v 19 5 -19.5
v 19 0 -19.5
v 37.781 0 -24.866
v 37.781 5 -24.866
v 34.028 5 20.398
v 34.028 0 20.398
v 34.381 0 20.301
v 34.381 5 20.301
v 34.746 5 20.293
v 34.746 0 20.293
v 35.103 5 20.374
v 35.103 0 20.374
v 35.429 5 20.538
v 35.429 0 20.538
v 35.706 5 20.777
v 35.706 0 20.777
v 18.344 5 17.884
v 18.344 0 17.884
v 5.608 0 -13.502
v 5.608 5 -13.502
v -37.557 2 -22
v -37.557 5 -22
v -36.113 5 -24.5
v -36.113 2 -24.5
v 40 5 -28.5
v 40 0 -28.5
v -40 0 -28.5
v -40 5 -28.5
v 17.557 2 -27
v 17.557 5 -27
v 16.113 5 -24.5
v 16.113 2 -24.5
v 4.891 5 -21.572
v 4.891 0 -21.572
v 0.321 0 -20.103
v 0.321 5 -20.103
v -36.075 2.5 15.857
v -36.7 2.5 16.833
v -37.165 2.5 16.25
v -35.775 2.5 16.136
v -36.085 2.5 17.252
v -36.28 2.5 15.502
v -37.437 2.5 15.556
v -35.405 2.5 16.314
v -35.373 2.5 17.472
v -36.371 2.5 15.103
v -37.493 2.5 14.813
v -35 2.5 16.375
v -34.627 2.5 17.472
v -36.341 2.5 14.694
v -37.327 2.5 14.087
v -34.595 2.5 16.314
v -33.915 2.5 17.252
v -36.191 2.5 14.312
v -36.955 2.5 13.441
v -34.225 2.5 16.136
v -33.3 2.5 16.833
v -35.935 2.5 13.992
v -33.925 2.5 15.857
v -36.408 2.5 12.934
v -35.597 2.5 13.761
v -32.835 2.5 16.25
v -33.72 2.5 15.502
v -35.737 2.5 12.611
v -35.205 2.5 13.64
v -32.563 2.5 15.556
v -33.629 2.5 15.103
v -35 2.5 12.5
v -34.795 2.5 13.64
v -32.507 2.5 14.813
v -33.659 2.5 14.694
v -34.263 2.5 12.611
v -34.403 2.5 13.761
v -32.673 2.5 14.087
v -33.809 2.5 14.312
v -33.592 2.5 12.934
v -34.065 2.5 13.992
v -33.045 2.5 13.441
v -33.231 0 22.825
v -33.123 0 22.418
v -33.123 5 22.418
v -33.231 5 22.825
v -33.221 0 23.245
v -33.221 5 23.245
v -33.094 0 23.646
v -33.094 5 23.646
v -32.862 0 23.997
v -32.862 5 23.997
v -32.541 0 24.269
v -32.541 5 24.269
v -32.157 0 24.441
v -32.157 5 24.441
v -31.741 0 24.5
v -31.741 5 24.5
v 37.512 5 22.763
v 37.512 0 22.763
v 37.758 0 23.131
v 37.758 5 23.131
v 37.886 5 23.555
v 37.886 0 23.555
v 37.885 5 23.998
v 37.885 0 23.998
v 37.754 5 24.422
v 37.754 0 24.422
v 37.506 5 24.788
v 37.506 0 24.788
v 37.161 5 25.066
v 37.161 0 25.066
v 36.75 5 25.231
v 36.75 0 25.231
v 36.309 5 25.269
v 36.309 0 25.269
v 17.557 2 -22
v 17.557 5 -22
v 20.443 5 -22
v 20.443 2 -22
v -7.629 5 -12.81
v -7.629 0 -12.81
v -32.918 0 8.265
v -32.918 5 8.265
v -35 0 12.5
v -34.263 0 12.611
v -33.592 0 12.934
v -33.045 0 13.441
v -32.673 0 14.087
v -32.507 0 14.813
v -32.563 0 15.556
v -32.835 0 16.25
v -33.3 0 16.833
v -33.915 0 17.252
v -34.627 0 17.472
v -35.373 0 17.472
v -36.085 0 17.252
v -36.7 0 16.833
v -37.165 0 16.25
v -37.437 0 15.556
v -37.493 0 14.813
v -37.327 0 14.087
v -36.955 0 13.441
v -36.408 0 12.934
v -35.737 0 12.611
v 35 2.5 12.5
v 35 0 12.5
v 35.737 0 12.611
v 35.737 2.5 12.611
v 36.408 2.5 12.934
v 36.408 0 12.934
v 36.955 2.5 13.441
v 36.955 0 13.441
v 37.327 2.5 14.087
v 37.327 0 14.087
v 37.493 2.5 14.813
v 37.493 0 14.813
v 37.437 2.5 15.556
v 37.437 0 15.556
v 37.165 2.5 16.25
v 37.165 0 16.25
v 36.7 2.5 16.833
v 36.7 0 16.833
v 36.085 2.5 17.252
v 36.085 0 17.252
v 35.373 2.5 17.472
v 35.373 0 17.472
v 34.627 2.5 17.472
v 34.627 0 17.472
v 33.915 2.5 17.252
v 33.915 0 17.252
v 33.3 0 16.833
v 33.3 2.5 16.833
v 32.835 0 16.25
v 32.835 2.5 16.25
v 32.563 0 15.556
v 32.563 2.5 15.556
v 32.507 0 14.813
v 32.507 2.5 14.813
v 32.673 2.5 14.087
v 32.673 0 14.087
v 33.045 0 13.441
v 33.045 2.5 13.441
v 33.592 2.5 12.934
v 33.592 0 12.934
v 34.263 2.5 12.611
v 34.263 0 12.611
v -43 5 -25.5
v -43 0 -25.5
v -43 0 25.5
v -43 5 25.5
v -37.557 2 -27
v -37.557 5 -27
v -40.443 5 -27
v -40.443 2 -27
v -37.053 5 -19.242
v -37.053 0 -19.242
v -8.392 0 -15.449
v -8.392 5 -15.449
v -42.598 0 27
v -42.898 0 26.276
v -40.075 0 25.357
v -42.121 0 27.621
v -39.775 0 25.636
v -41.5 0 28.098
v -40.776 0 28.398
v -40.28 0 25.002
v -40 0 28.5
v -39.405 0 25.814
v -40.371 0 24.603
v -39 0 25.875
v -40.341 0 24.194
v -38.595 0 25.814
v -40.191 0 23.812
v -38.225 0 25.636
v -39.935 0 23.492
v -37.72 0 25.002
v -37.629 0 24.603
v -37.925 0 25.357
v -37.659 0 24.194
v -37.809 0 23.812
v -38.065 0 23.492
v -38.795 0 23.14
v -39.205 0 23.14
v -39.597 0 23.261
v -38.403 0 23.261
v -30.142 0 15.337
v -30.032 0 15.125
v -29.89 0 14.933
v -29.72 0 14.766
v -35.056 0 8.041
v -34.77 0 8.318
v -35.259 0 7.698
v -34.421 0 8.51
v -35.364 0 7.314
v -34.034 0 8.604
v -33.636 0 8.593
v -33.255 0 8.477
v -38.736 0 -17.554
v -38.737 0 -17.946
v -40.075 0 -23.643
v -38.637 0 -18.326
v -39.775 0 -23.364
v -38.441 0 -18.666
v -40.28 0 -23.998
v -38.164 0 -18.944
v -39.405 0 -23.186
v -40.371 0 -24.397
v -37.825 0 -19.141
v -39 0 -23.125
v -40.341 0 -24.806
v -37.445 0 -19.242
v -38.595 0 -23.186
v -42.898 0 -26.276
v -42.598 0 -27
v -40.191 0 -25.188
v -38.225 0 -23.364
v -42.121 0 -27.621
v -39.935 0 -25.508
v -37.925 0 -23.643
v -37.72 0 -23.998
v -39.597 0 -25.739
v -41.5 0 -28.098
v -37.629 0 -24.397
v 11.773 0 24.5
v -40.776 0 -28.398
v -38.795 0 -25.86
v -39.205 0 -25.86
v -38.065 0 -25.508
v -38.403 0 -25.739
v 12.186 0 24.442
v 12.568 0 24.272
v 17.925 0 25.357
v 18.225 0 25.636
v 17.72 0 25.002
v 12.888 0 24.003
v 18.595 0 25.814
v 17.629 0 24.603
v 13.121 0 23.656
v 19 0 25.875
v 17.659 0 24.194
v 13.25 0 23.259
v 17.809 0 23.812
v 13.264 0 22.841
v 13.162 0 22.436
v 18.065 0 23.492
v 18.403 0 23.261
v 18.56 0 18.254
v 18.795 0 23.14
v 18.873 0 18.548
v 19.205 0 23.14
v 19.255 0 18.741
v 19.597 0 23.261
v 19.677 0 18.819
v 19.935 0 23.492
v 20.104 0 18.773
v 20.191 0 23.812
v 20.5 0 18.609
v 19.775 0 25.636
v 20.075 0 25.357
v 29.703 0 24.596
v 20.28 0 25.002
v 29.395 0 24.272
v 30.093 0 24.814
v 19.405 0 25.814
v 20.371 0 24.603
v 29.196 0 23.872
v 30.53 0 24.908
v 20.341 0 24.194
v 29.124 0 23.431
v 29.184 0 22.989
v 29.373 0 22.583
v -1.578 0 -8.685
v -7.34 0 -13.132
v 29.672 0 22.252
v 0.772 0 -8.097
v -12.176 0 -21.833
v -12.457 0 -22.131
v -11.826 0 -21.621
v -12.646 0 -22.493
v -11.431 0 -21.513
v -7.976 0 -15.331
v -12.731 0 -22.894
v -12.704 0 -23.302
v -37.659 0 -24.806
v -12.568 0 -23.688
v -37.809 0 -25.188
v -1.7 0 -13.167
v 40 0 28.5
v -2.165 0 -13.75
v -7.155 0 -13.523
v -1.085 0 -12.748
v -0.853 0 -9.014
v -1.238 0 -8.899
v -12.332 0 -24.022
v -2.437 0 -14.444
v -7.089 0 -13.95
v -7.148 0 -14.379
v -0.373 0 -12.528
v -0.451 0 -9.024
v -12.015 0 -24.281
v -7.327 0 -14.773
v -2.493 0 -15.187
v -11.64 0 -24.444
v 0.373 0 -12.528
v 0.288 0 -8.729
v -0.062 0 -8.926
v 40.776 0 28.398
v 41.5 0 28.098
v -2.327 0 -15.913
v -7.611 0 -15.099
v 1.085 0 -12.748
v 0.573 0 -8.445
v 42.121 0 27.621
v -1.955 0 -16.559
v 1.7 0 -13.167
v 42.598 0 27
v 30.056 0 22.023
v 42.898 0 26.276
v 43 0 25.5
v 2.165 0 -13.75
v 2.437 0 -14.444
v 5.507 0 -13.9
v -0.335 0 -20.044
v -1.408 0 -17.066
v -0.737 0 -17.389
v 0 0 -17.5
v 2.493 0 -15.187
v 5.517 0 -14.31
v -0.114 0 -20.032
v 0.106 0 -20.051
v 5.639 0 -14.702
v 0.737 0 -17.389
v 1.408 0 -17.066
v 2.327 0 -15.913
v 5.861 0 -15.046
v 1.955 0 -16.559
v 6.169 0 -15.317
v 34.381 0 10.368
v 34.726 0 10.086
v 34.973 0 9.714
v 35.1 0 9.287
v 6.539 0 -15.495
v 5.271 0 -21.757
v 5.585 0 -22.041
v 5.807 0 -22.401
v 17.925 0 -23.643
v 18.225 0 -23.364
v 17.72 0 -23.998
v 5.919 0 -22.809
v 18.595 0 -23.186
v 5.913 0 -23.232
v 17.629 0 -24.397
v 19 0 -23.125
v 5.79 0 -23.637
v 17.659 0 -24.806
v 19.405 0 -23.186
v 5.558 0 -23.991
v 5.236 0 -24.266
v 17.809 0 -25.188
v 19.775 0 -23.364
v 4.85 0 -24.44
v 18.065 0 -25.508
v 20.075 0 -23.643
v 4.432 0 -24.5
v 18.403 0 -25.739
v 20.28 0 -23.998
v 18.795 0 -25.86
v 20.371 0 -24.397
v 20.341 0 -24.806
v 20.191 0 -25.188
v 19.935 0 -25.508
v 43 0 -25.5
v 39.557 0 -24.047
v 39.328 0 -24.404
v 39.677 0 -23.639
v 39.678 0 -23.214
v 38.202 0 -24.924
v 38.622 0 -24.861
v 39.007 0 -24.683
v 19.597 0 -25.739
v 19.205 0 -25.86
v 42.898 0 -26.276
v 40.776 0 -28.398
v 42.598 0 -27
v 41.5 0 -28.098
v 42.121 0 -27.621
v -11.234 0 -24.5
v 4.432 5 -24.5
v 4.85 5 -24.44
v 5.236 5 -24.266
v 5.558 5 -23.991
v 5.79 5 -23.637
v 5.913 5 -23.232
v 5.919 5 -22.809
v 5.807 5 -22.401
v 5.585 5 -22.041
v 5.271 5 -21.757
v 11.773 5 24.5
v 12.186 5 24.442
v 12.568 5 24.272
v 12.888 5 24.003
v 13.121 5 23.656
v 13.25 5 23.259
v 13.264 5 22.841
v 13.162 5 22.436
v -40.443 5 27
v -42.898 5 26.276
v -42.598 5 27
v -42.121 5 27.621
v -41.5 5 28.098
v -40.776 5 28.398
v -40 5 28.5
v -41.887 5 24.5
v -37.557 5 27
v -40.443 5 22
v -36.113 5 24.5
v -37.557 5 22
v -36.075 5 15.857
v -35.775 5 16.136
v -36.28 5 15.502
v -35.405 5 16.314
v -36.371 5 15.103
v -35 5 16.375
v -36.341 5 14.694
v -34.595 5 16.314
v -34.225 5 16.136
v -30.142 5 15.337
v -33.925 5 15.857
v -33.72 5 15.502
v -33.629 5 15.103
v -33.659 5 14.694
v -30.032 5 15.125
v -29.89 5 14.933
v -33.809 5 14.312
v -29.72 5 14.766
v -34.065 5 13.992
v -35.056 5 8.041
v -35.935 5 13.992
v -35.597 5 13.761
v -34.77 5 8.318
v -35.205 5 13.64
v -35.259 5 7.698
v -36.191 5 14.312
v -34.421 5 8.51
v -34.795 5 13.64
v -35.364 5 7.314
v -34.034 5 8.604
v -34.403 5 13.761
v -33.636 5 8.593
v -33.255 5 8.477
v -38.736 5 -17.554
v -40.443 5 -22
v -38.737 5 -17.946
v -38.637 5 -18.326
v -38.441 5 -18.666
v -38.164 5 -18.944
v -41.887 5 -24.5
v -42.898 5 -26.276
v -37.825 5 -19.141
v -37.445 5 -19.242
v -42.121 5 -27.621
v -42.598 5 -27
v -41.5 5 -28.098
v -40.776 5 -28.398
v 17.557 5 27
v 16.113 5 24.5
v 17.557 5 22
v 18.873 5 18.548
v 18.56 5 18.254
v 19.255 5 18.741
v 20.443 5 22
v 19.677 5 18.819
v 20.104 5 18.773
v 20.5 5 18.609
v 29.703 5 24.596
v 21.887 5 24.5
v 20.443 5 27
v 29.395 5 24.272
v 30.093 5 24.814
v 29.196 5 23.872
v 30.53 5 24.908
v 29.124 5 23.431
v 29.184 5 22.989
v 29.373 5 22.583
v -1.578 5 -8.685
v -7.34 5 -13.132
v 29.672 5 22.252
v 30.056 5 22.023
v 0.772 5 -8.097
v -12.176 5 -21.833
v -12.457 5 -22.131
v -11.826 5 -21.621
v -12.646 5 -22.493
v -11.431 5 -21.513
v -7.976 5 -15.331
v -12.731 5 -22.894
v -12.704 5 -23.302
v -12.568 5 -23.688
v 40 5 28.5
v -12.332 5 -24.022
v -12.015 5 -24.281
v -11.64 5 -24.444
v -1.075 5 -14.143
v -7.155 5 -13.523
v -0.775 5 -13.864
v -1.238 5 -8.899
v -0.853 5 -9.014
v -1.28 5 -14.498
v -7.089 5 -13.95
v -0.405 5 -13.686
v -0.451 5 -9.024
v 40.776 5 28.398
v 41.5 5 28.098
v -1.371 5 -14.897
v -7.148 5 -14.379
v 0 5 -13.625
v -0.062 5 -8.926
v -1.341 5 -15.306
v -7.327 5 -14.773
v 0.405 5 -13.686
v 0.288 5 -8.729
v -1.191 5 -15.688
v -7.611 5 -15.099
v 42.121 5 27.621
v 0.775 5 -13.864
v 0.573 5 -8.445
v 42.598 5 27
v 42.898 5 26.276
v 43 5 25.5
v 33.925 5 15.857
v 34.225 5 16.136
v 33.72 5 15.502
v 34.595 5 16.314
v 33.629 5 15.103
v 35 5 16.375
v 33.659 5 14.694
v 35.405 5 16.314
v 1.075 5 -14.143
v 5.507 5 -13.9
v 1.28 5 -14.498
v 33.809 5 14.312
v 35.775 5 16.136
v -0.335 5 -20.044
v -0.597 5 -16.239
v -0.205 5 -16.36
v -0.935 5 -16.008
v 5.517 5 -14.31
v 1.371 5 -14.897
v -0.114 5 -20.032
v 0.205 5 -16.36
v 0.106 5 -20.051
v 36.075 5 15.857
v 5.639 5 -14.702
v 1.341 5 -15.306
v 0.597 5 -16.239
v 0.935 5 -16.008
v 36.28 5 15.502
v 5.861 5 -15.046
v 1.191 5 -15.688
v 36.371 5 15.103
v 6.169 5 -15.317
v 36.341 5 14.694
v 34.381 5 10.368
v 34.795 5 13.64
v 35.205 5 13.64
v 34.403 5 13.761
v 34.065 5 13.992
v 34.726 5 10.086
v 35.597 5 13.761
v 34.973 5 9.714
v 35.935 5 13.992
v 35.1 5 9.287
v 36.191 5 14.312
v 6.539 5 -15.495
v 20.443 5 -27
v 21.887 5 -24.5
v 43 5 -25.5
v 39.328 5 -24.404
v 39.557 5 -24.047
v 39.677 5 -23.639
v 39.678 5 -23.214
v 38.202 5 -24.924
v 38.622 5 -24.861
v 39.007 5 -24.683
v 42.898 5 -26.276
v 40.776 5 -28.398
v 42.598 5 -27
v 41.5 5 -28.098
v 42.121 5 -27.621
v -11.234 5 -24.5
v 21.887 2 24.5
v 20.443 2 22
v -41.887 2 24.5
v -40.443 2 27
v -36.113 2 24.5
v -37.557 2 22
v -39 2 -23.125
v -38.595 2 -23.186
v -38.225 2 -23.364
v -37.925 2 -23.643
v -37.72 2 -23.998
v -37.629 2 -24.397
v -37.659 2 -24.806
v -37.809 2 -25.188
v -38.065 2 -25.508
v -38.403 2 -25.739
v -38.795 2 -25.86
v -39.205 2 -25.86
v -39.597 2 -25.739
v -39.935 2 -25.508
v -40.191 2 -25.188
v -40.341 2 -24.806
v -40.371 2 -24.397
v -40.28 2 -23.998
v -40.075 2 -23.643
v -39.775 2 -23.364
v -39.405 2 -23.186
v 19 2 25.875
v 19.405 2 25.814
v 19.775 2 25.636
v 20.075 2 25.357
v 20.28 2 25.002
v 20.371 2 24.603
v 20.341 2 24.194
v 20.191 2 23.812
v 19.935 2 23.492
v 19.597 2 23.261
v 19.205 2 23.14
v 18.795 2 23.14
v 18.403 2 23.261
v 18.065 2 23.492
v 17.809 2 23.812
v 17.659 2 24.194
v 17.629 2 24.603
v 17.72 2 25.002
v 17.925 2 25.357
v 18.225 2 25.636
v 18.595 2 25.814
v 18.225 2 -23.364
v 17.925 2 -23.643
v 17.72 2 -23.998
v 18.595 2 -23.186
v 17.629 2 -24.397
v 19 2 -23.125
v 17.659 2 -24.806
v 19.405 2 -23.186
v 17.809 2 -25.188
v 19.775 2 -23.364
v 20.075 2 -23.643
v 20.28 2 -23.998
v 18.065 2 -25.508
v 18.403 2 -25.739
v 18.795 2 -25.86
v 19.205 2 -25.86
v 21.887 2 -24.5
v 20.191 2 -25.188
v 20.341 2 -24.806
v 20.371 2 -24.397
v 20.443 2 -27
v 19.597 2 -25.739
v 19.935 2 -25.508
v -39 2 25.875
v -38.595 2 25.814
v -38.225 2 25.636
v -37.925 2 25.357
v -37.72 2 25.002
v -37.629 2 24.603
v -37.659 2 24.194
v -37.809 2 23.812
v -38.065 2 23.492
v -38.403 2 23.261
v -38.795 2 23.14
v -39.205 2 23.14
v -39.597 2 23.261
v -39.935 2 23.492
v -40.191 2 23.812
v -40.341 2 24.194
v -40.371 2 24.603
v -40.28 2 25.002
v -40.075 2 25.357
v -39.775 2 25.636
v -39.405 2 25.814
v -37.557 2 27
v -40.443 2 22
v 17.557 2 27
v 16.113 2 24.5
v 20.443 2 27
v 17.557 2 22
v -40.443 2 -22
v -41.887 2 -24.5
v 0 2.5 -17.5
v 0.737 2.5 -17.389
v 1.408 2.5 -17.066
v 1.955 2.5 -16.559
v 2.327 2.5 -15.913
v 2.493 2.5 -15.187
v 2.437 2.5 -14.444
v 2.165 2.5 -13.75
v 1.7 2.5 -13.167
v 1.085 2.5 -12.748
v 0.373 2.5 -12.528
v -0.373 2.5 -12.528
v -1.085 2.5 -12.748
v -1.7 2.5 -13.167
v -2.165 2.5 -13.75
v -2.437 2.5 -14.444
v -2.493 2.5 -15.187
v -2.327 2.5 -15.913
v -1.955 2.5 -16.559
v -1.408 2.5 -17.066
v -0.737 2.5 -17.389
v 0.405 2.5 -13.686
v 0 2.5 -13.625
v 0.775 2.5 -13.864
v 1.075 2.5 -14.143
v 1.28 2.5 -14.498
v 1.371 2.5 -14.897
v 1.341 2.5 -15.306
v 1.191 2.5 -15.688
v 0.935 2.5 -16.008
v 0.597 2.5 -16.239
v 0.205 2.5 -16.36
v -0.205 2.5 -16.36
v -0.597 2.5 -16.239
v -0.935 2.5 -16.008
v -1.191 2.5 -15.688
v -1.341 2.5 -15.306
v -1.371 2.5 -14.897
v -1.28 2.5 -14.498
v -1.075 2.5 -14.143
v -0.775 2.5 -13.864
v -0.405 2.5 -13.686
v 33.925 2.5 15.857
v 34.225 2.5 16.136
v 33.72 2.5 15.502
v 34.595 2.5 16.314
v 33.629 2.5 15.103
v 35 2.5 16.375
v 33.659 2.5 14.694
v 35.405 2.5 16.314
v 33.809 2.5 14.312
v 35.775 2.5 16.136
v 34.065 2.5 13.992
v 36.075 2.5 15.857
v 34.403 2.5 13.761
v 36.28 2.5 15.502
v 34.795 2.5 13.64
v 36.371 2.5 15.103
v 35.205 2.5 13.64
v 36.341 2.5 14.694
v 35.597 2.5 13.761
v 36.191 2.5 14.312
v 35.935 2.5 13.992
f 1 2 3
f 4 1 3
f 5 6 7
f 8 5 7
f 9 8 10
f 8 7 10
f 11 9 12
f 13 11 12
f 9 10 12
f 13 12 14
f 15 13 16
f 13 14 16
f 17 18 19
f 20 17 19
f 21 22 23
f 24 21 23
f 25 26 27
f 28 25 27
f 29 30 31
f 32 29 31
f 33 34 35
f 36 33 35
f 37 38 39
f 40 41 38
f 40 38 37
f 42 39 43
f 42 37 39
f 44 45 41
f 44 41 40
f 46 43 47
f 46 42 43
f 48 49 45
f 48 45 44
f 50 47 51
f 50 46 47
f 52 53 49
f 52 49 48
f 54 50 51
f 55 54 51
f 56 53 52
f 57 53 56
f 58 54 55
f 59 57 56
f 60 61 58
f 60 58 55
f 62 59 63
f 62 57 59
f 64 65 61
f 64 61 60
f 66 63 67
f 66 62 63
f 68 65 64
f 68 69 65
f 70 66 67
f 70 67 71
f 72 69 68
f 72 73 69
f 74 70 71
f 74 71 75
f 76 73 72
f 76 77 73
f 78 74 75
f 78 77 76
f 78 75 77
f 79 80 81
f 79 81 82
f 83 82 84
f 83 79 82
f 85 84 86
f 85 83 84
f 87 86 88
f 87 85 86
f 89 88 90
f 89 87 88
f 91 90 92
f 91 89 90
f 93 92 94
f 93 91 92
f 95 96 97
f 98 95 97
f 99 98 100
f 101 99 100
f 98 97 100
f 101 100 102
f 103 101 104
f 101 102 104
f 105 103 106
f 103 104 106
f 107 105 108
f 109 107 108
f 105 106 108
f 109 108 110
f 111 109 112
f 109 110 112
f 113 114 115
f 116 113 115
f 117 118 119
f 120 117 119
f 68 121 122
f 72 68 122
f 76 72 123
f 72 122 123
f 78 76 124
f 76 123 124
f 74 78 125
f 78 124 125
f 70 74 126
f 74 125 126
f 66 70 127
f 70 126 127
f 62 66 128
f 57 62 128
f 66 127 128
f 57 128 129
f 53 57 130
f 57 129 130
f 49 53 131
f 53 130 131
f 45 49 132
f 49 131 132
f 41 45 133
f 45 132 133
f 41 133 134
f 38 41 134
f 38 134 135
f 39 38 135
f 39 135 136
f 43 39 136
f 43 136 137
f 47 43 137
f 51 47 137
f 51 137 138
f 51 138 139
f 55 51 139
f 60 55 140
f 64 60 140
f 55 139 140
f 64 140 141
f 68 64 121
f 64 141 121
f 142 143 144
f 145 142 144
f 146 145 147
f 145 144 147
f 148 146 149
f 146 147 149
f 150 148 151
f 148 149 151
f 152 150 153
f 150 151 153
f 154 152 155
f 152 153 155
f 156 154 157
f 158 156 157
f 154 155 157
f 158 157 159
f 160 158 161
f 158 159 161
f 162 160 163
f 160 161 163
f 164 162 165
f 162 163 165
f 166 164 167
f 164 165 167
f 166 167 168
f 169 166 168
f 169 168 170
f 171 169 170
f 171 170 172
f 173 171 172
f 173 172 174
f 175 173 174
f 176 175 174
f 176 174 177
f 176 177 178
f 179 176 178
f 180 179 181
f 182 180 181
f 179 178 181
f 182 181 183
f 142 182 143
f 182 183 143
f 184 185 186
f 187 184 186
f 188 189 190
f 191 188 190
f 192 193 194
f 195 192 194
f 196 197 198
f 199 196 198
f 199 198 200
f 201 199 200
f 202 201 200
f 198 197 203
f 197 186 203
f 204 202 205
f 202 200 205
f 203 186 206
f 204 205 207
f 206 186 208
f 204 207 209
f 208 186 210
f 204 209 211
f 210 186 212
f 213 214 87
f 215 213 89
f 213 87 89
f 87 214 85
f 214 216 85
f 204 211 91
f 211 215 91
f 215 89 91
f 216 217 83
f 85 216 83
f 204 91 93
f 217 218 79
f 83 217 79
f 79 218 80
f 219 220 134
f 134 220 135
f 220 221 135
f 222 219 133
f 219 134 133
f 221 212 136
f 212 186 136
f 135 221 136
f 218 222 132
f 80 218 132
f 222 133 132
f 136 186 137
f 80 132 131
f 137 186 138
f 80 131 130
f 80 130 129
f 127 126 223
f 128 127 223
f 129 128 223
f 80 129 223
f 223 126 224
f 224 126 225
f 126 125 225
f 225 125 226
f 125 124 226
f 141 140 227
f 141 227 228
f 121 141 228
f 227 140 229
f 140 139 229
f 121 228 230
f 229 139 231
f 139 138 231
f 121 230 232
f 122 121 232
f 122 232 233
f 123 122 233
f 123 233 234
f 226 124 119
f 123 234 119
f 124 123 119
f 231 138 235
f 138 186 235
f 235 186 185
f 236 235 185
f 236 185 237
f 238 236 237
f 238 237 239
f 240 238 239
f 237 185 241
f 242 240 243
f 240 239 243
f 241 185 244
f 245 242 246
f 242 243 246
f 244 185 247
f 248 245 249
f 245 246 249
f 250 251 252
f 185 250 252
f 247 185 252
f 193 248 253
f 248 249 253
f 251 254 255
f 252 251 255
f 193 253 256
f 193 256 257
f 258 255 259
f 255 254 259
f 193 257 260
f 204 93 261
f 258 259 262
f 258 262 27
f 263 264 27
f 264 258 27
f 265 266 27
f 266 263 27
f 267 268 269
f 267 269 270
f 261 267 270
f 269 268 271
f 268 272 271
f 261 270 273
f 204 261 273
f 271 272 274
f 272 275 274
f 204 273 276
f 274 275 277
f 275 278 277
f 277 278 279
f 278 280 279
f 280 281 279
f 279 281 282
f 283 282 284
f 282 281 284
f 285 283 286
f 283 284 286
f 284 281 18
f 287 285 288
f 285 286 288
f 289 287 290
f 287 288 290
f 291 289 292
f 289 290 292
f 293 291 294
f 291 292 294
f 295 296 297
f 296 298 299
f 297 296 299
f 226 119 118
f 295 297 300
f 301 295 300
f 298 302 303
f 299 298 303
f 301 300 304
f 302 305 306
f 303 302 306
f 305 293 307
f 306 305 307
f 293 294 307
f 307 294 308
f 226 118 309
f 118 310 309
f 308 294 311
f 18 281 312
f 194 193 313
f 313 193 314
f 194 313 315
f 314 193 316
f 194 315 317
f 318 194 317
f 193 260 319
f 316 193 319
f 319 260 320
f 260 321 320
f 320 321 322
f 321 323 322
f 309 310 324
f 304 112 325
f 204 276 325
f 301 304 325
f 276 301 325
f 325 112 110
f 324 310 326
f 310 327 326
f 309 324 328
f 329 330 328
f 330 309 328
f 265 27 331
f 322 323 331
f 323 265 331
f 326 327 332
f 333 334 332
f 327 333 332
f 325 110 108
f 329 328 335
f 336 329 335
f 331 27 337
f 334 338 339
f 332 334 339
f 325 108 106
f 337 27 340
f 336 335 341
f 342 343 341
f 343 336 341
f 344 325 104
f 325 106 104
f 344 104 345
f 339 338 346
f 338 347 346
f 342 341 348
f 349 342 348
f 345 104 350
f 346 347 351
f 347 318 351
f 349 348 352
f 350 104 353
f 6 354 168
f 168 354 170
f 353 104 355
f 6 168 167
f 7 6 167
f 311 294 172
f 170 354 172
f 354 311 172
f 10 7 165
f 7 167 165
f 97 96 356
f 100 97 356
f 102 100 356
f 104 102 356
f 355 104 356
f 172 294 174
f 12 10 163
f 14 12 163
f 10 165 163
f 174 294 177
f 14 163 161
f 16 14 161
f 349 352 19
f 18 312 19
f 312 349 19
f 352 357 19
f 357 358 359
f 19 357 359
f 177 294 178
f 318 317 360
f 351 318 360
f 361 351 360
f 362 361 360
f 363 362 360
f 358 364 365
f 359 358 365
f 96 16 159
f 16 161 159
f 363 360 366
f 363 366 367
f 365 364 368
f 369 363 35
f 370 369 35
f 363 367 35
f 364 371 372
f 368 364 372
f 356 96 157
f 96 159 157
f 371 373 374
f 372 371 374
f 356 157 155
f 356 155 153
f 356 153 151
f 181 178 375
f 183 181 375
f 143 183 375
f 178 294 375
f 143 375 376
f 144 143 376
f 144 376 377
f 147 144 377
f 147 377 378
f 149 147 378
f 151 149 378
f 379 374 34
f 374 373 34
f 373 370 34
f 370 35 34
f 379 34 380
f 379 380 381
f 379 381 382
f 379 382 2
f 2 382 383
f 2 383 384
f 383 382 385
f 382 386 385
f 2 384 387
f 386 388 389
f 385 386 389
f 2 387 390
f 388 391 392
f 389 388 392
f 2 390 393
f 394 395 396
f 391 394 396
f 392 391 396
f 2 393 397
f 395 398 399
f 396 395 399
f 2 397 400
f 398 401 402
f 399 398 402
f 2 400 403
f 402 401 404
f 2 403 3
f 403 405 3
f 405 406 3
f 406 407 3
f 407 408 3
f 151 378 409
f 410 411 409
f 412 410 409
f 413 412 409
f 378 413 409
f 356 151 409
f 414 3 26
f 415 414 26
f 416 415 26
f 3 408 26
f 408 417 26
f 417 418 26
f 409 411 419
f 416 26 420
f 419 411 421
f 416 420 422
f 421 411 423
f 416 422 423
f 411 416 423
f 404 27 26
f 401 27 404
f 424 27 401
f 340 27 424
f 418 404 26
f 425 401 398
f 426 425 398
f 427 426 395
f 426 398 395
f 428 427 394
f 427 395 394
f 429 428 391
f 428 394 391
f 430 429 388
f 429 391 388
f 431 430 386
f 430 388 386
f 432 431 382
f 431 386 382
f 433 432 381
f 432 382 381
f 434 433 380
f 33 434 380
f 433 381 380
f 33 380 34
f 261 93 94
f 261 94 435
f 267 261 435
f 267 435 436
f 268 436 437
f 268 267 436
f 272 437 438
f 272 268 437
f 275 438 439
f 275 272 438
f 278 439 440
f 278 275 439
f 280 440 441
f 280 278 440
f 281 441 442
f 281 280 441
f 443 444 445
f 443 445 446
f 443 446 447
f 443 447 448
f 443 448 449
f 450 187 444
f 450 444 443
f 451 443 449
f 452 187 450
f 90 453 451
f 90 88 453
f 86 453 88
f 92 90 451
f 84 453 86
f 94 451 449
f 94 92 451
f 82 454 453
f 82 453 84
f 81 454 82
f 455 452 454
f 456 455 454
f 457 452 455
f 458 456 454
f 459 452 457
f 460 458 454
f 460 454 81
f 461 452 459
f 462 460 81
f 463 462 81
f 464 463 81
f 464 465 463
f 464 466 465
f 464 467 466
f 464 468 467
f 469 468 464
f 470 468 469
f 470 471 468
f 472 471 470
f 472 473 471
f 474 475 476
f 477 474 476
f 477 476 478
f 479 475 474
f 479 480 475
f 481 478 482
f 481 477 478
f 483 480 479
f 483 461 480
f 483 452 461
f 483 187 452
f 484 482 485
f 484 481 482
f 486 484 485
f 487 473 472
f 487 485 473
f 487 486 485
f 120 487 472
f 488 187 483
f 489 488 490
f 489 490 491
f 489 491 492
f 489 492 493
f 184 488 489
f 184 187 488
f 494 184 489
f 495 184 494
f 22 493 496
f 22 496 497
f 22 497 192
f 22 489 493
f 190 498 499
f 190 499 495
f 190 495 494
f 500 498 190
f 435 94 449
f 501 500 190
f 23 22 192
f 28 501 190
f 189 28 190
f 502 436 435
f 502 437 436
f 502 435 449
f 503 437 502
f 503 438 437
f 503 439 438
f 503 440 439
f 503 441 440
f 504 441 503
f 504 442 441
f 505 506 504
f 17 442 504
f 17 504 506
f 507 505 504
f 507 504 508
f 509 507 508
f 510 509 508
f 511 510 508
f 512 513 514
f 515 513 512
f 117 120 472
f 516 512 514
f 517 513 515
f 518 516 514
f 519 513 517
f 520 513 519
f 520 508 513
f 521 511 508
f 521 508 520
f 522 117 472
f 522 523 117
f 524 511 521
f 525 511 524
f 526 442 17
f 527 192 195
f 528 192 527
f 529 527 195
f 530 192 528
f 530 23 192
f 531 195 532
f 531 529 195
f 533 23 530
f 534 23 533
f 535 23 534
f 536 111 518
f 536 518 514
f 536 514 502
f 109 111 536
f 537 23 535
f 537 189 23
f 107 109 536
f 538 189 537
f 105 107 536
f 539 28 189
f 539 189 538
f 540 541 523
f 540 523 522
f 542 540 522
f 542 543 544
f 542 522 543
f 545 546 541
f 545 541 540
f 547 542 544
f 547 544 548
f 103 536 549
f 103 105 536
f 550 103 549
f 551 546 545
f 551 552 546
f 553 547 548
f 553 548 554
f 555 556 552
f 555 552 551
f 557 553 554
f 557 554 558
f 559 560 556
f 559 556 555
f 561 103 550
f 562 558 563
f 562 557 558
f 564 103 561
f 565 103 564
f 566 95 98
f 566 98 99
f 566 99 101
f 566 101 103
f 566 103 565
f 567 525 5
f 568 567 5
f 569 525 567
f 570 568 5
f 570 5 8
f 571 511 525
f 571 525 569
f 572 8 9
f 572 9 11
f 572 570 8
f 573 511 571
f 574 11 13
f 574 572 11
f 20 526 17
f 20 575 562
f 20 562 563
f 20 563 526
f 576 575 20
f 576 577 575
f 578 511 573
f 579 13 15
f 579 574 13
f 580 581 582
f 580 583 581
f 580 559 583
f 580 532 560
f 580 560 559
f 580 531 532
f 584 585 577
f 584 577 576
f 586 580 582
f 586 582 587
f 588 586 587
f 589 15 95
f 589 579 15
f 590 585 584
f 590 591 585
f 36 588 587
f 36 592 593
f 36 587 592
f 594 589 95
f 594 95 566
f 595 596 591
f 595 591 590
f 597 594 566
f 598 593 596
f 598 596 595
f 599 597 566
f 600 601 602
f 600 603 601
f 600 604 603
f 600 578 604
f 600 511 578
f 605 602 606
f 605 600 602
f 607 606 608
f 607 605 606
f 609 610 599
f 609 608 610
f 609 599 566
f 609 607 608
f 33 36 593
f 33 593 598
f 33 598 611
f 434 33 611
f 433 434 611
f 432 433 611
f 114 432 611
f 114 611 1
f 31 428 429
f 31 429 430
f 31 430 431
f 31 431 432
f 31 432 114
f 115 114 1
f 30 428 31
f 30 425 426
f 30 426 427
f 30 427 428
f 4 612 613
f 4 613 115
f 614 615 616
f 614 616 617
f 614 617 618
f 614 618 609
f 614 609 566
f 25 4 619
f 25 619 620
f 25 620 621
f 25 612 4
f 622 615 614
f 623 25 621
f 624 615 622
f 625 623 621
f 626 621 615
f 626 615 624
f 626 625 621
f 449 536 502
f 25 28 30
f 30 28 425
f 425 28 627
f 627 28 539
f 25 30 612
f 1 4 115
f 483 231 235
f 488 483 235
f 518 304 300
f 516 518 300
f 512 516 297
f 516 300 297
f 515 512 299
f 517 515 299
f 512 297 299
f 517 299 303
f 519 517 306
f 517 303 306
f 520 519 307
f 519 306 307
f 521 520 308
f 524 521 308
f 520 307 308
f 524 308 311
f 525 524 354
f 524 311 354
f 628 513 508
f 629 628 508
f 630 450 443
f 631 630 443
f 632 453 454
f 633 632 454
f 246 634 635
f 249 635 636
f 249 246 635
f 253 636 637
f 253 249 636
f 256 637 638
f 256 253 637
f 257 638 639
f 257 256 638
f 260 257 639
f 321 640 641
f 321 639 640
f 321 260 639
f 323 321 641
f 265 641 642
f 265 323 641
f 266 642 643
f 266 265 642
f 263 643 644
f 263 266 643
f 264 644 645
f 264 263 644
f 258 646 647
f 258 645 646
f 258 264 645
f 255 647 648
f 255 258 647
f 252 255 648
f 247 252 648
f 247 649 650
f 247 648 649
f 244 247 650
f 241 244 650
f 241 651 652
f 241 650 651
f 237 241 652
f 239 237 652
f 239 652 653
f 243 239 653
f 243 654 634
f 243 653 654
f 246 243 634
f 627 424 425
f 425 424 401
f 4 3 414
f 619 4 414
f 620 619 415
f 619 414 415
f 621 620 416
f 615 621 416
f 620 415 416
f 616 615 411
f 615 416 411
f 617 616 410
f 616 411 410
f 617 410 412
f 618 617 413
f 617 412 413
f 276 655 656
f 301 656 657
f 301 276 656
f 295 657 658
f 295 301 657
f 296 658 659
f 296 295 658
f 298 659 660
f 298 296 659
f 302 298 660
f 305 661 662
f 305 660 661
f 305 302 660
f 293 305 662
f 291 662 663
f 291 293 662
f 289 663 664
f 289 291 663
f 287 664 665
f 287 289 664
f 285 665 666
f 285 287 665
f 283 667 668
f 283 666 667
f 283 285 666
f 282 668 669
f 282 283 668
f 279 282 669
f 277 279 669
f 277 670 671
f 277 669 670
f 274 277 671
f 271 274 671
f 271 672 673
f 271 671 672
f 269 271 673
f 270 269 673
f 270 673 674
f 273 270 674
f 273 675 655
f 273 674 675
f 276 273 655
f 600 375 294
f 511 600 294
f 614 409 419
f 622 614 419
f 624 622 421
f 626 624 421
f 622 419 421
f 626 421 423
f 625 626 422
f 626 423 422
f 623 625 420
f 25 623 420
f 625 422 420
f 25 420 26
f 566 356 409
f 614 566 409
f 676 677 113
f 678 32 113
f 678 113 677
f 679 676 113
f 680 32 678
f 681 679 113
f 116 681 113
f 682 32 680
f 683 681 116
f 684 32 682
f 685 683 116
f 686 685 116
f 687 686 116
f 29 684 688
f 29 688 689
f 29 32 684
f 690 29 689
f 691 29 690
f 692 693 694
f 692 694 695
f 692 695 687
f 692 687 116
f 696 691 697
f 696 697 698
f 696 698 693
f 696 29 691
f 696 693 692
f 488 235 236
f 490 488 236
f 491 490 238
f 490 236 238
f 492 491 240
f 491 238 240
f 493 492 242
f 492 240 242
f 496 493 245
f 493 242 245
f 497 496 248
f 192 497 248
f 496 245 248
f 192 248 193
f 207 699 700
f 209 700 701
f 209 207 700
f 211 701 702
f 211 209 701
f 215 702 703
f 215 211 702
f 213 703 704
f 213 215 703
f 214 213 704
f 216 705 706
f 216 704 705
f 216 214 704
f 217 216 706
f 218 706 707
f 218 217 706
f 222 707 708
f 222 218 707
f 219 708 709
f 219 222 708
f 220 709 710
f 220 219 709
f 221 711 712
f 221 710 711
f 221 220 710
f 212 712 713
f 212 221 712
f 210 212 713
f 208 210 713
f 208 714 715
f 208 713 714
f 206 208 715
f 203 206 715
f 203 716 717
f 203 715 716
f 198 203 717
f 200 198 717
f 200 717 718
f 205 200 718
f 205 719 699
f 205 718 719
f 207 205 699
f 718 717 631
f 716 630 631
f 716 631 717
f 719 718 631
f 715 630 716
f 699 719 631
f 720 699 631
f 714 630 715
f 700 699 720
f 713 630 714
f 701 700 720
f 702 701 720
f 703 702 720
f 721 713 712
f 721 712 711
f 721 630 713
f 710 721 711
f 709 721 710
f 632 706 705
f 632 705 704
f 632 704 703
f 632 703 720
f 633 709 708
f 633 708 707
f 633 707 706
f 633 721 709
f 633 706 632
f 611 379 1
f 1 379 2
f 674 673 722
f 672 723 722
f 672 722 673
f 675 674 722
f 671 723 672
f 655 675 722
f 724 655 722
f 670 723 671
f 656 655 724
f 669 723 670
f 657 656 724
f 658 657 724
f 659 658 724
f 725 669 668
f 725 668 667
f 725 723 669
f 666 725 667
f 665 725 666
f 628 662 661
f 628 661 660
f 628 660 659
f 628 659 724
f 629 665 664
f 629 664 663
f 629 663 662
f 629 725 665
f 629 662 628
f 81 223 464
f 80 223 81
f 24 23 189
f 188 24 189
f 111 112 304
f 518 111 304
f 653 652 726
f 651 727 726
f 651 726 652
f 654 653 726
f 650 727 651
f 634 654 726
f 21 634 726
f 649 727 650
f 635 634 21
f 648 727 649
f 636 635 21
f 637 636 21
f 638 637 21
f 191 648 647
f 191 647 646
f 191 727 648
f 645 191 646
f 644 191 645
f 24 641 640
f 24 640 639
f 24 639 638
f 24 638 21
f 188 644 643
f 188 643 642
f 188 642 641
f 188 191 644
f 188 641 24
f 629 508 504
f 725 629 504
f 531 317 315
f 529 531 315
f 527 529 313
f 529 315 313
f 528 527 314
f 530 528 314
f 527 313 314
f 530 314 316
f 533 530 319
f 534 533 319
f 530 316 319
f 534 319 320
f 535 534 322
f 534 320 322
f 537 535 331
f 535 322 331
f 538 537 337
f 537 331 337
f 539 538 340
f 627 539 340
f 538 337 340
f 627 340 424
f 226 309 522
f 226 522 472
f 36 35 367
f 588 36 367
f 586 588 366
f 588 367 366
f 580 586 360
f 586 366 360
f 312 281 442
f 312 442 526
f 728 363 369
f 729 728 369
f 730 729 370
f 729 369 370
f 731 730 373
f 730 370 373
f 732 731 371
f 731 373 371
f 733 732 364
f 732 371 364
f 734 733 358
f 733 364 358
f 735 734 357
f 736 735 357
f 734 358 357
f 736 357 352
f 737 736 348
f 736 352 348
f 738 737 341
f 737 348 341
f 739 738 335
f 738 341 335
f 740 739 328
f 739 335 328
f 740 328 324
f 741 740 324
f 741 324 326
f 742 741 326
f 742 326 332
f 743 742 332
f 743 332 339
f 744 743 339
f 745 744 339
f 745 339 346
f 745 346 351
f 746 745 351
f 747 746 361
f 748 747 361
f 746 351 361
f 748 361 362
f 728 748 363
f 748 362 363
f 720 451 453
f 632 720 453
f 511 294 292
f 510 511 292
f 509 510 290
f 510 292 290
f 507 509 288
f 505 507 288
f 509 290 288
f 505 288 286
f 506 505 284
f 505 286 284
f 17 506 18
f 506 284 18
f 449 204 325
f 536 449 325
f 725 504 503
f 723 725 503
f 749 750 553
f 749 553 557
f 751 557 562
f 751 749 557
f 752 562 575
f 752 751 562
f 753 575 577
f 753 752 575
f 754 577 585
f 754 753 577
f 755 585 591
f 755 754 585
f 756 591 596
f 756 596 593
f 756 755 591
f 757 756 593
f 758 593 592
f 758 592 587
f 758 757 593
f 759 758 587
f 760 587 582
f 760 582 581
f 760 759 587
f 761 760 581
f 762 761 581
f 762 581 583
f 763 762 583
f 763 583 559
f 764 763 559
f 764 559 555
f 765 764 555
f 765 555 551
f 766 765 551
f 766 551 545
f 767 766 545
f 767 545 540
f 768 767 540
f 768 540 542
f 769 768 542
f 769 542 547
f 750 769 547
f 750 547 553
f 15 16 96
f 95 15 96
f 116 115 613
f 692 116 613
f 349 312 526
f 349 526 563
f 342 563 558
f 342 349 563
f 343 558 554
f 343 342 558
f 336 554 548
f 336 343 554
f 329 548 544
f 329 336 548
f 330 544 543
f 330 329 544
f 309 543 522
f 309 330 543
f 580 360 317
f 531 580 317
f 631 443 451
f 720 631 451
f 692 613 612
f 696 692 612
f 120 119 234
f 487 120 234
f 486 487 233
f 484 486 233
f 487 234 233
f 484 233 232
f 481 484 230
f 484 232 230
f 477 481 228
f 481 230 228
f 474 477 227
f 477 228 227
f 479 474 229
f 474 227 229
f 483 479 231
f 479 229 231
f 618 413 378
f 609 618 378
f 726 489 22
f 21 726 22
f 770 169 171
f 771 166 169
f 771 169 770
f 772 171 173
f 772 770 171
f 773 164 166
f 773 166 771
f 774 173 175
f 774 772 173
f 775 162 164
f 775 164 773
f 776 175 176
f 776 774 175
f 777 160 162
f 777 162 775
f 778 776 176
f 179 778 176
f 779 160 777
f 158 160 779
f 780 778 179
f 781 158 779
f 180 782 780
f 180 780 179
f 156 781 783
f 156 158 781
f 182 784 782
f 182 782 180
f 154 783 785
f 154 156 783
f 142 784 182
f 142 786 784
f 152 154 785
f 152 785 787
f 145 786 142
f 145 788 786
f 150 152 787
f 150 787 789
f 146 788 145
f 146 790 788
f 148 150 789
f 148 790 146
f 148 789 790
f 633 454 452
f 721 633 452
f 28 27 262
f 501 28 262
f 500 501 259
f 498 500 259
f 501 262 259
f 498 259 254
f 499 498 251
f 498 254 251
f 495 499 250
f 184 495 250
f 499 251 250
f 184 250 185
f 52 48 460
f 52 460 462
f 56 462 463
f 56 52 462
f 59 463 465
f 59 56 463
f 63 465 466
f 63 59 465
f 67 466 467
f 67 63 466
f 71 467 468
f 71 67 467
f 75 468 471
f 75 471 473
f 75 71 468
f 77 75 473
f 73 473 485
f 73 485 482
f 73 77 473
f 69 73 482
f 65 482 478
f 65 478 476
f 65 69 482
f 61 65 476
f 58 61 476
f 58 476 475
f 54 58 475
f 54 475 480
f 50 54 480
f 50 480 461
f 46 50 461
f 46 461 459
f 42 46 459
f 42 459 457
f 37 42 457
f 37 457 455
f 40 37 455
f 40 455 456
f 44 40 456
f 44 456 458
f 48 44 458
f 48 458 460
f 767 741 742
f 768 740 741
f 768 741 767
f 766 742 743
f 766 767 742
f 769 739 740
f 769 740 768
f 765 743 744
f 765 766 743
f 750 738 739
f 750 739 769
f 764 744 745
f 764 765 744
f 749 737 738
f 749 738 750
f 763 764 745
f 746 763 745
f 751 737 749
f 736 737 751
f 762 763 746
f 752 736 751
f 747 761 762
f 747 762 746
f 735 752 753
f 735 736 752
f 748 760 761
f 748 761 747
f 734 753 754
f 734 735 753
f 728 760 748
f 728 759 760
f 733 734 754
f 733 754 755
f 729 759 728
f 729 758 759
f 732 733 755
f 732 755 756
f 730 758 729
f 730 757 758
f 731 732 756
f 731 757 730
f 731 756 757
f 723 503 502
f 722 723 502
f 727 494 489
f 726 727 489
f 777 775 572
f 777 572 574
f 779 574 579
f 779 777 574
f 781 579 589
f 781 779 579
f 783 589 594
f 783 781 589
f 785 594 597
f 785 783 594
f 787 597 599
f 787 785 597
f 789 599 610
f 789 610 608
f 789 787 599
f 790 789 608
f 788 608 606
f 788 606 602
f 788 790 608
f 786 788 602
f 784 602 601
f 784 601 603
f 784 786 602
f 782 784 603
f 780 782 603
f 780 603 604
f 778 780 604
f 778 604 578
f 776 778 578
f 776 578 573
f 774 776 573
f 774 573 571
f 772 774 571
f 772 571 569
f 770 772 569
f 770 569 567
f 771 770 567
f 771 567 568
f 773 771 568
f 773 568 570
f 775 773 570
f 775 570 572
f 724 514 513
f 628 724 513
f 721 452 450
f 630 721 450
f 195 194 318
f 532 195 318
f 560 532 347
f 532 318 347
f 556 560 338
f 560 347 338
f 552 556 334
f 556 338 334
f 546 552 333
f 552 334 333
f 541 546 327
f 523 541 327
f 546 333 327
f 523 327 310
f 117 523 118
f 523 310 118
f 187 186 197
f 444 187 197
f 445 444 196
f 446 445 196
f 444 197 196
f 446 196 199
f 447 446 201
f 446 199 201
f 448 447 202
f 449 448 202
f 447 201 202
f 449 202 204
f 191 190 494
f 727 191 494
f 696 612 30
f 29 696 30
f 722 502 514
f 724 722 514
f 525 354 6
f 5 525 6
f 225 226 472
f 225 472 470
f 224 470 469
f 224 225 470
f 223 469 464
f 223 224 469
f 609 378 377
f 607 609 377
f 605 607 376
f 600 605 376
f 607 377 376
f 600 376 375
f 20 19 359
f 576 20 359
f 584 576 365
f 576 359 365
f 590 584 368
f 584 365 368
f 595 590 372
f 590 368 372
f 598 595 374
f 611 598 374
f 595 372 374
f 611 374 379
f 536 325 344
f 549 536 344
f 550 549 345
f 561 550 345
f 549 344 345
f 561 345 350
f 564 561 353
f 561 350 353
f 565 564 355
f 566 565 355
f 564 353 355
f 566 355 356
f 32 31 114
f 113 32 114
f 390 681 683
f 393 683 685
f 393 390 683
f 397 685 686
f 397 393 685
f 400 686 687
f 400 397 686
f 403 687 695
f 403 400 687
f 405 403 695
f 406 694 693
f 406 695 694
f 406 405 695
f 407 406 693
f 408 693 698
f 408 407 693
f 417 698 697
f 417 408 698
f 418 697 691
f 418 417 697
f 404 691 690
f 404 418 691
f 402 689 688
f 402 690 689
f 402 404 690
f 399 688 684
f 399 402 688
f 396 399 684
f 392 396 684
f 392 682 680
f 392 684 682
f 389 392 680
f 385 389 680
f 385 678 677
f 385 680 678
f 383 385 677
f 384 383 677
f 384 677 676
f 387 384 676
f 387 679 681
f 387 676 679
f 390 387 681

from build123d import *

# Parameters (mm, degrees)
SKETCH1_R           = 1.375
BOSS_EXTRUDE1_DEPTH = 5
CUT_EXTRUDE1_DEPTH  = 3
SKETCH3_R           = 2.5
CUT_EXTRUDE2_DEPTH  = 2.5


with BuildPart() as part:
    # Sketch1 → Boss-Extrude1 (new body)
    with BuildSketch(Plane(origin=(0, 0, 0), x_dir=(1, 0, 0), z_dir=(0, 1, 0))):
        with BuildLine():
            Line((-40, -28.5), (40, -28.5))
            ThreePointArc((40, -28.5), (42.121320344, -27.621320344), (43, -25.5))
            Line((43, -25.5), (43, 25.5))
            ThreePointArc((43, 25.5), (42.121320344, 27.621320344), (40, 28.5))
            Line((40, 28.5), (-40, 28.5))
            ThreePointArc((-40, 28.5), (-42.121320344, 27.621320344), (-43, 25.5))
            Line((-43, 25.5), (-43, -25.5))
            ThreePointArc((-43, -25.5), (-42.121320344, -27.621320344), (-40, -28.5))
        make_face()
        with Locations(Location((0, 15, 0), (0, 0, 270))):
            Circle(SKETCH1_R, mode=Mode.SUBTRACT)
        with Locations(Location((-35, -15, 0), (0, 0, 270))):
            Circle(SKETCH1_R, mode=Mode.SUBTRACT)
        with Locations(Location((35, -15, 0), (0, 0, 270))):
            Circle(SKETCH1_R, mode=Mode.SUBTRACT)
        with Locations(Location((-39, 24.5, 0), (0, 0, 270))):
            Circle(SKETCH1_R, mode=Mode.SUBTRACT)
        with Locations(Location((19, 24.5, 0), (0, 0, 270))):
            Circle(SKETCH1_R, mode=Mode.SUBTRACT)
        with Locations(Location((19, -24.5, 0), (0, 0, 270))):
            Circle(SKETCH1_R, mode=Mode.SUBTRACT)
        with Locations(Location((-39, -24.5, 0), (0, 0, 270))):
            Circle(SKETCH1_R, mode=Mode.SUBTRACT)
        with BuildLine():
            Line((-37.052885882, 19.24229372), (-8.391974967, 15.448937863))
            ThreePointArc((-8.391974967, 15.448937863), (-7.147859594, 14.378709263), (-7.628511446, 12.809573795))
            Line((-7.628511446, 12.809573795), (-32.917550489, -8.264625407))
            ThreePointArc((-32.917550489, -8.264625407), (-34.421149889, -8.510435231), (-35.364225221, -7.313838997))
            Line((-35.364225221, -7.313838997), (-38.736097093, 17.553716061))
            ThreePointArc((-38.736097093, 17.553716061), (-38.312045905, 18.814232283), (-37.052885882, 19.24229372))
        make_face(mode=Mode.SUBTRACT)
        with BuildLine():
            Line((-1.577880073, 8.685099939), (-29.719509612, -14.76625801))
            ThreePointArc((-29.719509612, -14.76625801), (-29.964799607, -15.026060273), (-30.141686076, -15.33650443))
            Line((-30.141686076, -15.33650443), (-33.123332421, -22.4179145))
            ThreePointArc((-33.123332421, -22.4179145), (-32.990504952, -23.829720359), (-31.740879358, -24.5))
            Line((-31.740879358, -24.5), (11.772505288, -24.5))
            ThreePointArc((11.772505288, -24.5), (13.016699367, -23.83784312), (13.162424553, -22.435974791))
            Line((13.162424553, -22.435974791), (0.772315791, 8.096793229))
            ThreePointArc((0.772315791, 8.096793229), (-0.253358499, 8.987871314), (-1.577880073, 8.685099939))
        make_face(mode=Mode.SUBTRACT)
        with BuildLine():
            Line((-11.234499574, 24.5), (4.43151961, 24.5))
            ThreePointArc((4.43151961, 24.5), (5.913421136, 23.232309855), (4.890533381, 21.571957158))
            Line((4.890533381, 21.571957158), (0.321277785, 20.10326786))
            ThreePointArc((0.321277785, 20.10326786), (-0.003358772, 20.037341905), (-0.334549064, 20.044278553))
            Line((-0.334549064, 20.044278553), (-11.431312652, 21.512967851))
            ThreePointArc((-11.431312652, 21.512967851), (-12.7312541, 23.098619918), (-11.234499574, 24.5))
        make_face(mode=Mode.SUBTRACT)
        with BuildLine():
            Line((6.538594674, 15.494548288), (19, 19.5))
            Line((19, 19.5), (37.780665263, 24.865904361))
            ThreePointArc((37.780665263, 24.865904361), (39.177543611, 24.555066868), (39.678086712, 23.214415657))
            Line((39.678086712, 23.214415657), (35.10041997, -9.287018213))
            ThreePointArc((35.10041997, -9.287018213), (34.8636112, -9.909181999), (34.380888344, -10.367597546))
            Line((34.380888344, -10.367597546), (20.4998423, -18.609468634))
            ThreePointArc((20.4998423, -18.609468634), (19.255432614, -18.741284405), (18.344114904, -17.883711727))
            Line((18.344114904, -17.883711727), (5.607689179, 13.502480237))
            ThreePointArc((5.607689179, 13.502480237), (5.638666899, 14.70154708), (6.538594674, 15.494548288))
        make_face(mode=Mode.SUBTRACT)
        with BuildLine():
            Line((30.055567192, -22.022722512), (34.028332843, -20.397500201))
            ThreePointArc((34.028332843, -20.397500201), (34.927038281, -20.322741568), (35.706192222, -20.776811444))
            Line((35.706192222, -20.776811444), (37.51199479, -22.763194269))
            ThreePointArc((37.51199479, -22.763194269), (37.754252366, -24.421543548), (36.308517251, -25.269282328))
            Line((36.308517251, -25.269282328), (30.529949031, -24.908121814))
            ThreePointArc((30.529949031, -24.908121814), (29.14338695, -23.654387623), (30.055567192, -22.022722512))
        make_face(mode=Mode.SUBTRACT)
    extrude(amount=BOSS_EXTRUDE1_DEPTH)

    # Sketch2 → Cut-Extrude1 (cut)
    with BuildSketch(Plane(origin=(0, 5, 0), x_dir=(1, 0, 0), z_dir=(0, 1, 0))):
        Polygon((-36.113248654, 24.5), (-37.556624327, 27), (-40.443375673, 27), (-41.886751346, 24.5), (-40.443375673, 22), (-37.556624327, 22), align=None)
        Polygon((20.443375673, 27), (17.556624327, 27), (16.113248654, 24.5), (17.556624327, 22), (20.443375673, 22), (21.886751346, 24.5), align=None)
        Polygon((20.443375673, -22), (17.556624327, -22), (16.113248654, -24.5), (17.556624327, -27), (20.443375673, -27), (21.886751346, -24.5), align=None)
        Polygon((-36.113248654, -24.5), (-37.556624327, -22), (-40.443375673, -22), (-41.886751346, -24.5), (-40.443375673, -27), (-37.556624327, -27), align=None)
    extrude(amount=-CUT_EXTRUDE1_DEPTH, mode=Mode.SUBTRACT)

    # Sketch3 → Cut-Extrude2 (cut)
    with BuildSketch(Plane.XZ):
        with Locations(Location((-35, 15, 0), (0, 0, 270))):
            Circle(SKETCH3_R)
        with Locations(Location((35, 15, 0), (0, 0, 270))):
            Circle(SKETCH3_R)
        with Locations(Location((0, -15, 0), (0, 0, 270))):
            Circle(SKETCH3_R)
    extrude(amount=-CUT_EXTRUDE2_DEPTH, mode=Mode.SUBTRACT)


solid = part.part
